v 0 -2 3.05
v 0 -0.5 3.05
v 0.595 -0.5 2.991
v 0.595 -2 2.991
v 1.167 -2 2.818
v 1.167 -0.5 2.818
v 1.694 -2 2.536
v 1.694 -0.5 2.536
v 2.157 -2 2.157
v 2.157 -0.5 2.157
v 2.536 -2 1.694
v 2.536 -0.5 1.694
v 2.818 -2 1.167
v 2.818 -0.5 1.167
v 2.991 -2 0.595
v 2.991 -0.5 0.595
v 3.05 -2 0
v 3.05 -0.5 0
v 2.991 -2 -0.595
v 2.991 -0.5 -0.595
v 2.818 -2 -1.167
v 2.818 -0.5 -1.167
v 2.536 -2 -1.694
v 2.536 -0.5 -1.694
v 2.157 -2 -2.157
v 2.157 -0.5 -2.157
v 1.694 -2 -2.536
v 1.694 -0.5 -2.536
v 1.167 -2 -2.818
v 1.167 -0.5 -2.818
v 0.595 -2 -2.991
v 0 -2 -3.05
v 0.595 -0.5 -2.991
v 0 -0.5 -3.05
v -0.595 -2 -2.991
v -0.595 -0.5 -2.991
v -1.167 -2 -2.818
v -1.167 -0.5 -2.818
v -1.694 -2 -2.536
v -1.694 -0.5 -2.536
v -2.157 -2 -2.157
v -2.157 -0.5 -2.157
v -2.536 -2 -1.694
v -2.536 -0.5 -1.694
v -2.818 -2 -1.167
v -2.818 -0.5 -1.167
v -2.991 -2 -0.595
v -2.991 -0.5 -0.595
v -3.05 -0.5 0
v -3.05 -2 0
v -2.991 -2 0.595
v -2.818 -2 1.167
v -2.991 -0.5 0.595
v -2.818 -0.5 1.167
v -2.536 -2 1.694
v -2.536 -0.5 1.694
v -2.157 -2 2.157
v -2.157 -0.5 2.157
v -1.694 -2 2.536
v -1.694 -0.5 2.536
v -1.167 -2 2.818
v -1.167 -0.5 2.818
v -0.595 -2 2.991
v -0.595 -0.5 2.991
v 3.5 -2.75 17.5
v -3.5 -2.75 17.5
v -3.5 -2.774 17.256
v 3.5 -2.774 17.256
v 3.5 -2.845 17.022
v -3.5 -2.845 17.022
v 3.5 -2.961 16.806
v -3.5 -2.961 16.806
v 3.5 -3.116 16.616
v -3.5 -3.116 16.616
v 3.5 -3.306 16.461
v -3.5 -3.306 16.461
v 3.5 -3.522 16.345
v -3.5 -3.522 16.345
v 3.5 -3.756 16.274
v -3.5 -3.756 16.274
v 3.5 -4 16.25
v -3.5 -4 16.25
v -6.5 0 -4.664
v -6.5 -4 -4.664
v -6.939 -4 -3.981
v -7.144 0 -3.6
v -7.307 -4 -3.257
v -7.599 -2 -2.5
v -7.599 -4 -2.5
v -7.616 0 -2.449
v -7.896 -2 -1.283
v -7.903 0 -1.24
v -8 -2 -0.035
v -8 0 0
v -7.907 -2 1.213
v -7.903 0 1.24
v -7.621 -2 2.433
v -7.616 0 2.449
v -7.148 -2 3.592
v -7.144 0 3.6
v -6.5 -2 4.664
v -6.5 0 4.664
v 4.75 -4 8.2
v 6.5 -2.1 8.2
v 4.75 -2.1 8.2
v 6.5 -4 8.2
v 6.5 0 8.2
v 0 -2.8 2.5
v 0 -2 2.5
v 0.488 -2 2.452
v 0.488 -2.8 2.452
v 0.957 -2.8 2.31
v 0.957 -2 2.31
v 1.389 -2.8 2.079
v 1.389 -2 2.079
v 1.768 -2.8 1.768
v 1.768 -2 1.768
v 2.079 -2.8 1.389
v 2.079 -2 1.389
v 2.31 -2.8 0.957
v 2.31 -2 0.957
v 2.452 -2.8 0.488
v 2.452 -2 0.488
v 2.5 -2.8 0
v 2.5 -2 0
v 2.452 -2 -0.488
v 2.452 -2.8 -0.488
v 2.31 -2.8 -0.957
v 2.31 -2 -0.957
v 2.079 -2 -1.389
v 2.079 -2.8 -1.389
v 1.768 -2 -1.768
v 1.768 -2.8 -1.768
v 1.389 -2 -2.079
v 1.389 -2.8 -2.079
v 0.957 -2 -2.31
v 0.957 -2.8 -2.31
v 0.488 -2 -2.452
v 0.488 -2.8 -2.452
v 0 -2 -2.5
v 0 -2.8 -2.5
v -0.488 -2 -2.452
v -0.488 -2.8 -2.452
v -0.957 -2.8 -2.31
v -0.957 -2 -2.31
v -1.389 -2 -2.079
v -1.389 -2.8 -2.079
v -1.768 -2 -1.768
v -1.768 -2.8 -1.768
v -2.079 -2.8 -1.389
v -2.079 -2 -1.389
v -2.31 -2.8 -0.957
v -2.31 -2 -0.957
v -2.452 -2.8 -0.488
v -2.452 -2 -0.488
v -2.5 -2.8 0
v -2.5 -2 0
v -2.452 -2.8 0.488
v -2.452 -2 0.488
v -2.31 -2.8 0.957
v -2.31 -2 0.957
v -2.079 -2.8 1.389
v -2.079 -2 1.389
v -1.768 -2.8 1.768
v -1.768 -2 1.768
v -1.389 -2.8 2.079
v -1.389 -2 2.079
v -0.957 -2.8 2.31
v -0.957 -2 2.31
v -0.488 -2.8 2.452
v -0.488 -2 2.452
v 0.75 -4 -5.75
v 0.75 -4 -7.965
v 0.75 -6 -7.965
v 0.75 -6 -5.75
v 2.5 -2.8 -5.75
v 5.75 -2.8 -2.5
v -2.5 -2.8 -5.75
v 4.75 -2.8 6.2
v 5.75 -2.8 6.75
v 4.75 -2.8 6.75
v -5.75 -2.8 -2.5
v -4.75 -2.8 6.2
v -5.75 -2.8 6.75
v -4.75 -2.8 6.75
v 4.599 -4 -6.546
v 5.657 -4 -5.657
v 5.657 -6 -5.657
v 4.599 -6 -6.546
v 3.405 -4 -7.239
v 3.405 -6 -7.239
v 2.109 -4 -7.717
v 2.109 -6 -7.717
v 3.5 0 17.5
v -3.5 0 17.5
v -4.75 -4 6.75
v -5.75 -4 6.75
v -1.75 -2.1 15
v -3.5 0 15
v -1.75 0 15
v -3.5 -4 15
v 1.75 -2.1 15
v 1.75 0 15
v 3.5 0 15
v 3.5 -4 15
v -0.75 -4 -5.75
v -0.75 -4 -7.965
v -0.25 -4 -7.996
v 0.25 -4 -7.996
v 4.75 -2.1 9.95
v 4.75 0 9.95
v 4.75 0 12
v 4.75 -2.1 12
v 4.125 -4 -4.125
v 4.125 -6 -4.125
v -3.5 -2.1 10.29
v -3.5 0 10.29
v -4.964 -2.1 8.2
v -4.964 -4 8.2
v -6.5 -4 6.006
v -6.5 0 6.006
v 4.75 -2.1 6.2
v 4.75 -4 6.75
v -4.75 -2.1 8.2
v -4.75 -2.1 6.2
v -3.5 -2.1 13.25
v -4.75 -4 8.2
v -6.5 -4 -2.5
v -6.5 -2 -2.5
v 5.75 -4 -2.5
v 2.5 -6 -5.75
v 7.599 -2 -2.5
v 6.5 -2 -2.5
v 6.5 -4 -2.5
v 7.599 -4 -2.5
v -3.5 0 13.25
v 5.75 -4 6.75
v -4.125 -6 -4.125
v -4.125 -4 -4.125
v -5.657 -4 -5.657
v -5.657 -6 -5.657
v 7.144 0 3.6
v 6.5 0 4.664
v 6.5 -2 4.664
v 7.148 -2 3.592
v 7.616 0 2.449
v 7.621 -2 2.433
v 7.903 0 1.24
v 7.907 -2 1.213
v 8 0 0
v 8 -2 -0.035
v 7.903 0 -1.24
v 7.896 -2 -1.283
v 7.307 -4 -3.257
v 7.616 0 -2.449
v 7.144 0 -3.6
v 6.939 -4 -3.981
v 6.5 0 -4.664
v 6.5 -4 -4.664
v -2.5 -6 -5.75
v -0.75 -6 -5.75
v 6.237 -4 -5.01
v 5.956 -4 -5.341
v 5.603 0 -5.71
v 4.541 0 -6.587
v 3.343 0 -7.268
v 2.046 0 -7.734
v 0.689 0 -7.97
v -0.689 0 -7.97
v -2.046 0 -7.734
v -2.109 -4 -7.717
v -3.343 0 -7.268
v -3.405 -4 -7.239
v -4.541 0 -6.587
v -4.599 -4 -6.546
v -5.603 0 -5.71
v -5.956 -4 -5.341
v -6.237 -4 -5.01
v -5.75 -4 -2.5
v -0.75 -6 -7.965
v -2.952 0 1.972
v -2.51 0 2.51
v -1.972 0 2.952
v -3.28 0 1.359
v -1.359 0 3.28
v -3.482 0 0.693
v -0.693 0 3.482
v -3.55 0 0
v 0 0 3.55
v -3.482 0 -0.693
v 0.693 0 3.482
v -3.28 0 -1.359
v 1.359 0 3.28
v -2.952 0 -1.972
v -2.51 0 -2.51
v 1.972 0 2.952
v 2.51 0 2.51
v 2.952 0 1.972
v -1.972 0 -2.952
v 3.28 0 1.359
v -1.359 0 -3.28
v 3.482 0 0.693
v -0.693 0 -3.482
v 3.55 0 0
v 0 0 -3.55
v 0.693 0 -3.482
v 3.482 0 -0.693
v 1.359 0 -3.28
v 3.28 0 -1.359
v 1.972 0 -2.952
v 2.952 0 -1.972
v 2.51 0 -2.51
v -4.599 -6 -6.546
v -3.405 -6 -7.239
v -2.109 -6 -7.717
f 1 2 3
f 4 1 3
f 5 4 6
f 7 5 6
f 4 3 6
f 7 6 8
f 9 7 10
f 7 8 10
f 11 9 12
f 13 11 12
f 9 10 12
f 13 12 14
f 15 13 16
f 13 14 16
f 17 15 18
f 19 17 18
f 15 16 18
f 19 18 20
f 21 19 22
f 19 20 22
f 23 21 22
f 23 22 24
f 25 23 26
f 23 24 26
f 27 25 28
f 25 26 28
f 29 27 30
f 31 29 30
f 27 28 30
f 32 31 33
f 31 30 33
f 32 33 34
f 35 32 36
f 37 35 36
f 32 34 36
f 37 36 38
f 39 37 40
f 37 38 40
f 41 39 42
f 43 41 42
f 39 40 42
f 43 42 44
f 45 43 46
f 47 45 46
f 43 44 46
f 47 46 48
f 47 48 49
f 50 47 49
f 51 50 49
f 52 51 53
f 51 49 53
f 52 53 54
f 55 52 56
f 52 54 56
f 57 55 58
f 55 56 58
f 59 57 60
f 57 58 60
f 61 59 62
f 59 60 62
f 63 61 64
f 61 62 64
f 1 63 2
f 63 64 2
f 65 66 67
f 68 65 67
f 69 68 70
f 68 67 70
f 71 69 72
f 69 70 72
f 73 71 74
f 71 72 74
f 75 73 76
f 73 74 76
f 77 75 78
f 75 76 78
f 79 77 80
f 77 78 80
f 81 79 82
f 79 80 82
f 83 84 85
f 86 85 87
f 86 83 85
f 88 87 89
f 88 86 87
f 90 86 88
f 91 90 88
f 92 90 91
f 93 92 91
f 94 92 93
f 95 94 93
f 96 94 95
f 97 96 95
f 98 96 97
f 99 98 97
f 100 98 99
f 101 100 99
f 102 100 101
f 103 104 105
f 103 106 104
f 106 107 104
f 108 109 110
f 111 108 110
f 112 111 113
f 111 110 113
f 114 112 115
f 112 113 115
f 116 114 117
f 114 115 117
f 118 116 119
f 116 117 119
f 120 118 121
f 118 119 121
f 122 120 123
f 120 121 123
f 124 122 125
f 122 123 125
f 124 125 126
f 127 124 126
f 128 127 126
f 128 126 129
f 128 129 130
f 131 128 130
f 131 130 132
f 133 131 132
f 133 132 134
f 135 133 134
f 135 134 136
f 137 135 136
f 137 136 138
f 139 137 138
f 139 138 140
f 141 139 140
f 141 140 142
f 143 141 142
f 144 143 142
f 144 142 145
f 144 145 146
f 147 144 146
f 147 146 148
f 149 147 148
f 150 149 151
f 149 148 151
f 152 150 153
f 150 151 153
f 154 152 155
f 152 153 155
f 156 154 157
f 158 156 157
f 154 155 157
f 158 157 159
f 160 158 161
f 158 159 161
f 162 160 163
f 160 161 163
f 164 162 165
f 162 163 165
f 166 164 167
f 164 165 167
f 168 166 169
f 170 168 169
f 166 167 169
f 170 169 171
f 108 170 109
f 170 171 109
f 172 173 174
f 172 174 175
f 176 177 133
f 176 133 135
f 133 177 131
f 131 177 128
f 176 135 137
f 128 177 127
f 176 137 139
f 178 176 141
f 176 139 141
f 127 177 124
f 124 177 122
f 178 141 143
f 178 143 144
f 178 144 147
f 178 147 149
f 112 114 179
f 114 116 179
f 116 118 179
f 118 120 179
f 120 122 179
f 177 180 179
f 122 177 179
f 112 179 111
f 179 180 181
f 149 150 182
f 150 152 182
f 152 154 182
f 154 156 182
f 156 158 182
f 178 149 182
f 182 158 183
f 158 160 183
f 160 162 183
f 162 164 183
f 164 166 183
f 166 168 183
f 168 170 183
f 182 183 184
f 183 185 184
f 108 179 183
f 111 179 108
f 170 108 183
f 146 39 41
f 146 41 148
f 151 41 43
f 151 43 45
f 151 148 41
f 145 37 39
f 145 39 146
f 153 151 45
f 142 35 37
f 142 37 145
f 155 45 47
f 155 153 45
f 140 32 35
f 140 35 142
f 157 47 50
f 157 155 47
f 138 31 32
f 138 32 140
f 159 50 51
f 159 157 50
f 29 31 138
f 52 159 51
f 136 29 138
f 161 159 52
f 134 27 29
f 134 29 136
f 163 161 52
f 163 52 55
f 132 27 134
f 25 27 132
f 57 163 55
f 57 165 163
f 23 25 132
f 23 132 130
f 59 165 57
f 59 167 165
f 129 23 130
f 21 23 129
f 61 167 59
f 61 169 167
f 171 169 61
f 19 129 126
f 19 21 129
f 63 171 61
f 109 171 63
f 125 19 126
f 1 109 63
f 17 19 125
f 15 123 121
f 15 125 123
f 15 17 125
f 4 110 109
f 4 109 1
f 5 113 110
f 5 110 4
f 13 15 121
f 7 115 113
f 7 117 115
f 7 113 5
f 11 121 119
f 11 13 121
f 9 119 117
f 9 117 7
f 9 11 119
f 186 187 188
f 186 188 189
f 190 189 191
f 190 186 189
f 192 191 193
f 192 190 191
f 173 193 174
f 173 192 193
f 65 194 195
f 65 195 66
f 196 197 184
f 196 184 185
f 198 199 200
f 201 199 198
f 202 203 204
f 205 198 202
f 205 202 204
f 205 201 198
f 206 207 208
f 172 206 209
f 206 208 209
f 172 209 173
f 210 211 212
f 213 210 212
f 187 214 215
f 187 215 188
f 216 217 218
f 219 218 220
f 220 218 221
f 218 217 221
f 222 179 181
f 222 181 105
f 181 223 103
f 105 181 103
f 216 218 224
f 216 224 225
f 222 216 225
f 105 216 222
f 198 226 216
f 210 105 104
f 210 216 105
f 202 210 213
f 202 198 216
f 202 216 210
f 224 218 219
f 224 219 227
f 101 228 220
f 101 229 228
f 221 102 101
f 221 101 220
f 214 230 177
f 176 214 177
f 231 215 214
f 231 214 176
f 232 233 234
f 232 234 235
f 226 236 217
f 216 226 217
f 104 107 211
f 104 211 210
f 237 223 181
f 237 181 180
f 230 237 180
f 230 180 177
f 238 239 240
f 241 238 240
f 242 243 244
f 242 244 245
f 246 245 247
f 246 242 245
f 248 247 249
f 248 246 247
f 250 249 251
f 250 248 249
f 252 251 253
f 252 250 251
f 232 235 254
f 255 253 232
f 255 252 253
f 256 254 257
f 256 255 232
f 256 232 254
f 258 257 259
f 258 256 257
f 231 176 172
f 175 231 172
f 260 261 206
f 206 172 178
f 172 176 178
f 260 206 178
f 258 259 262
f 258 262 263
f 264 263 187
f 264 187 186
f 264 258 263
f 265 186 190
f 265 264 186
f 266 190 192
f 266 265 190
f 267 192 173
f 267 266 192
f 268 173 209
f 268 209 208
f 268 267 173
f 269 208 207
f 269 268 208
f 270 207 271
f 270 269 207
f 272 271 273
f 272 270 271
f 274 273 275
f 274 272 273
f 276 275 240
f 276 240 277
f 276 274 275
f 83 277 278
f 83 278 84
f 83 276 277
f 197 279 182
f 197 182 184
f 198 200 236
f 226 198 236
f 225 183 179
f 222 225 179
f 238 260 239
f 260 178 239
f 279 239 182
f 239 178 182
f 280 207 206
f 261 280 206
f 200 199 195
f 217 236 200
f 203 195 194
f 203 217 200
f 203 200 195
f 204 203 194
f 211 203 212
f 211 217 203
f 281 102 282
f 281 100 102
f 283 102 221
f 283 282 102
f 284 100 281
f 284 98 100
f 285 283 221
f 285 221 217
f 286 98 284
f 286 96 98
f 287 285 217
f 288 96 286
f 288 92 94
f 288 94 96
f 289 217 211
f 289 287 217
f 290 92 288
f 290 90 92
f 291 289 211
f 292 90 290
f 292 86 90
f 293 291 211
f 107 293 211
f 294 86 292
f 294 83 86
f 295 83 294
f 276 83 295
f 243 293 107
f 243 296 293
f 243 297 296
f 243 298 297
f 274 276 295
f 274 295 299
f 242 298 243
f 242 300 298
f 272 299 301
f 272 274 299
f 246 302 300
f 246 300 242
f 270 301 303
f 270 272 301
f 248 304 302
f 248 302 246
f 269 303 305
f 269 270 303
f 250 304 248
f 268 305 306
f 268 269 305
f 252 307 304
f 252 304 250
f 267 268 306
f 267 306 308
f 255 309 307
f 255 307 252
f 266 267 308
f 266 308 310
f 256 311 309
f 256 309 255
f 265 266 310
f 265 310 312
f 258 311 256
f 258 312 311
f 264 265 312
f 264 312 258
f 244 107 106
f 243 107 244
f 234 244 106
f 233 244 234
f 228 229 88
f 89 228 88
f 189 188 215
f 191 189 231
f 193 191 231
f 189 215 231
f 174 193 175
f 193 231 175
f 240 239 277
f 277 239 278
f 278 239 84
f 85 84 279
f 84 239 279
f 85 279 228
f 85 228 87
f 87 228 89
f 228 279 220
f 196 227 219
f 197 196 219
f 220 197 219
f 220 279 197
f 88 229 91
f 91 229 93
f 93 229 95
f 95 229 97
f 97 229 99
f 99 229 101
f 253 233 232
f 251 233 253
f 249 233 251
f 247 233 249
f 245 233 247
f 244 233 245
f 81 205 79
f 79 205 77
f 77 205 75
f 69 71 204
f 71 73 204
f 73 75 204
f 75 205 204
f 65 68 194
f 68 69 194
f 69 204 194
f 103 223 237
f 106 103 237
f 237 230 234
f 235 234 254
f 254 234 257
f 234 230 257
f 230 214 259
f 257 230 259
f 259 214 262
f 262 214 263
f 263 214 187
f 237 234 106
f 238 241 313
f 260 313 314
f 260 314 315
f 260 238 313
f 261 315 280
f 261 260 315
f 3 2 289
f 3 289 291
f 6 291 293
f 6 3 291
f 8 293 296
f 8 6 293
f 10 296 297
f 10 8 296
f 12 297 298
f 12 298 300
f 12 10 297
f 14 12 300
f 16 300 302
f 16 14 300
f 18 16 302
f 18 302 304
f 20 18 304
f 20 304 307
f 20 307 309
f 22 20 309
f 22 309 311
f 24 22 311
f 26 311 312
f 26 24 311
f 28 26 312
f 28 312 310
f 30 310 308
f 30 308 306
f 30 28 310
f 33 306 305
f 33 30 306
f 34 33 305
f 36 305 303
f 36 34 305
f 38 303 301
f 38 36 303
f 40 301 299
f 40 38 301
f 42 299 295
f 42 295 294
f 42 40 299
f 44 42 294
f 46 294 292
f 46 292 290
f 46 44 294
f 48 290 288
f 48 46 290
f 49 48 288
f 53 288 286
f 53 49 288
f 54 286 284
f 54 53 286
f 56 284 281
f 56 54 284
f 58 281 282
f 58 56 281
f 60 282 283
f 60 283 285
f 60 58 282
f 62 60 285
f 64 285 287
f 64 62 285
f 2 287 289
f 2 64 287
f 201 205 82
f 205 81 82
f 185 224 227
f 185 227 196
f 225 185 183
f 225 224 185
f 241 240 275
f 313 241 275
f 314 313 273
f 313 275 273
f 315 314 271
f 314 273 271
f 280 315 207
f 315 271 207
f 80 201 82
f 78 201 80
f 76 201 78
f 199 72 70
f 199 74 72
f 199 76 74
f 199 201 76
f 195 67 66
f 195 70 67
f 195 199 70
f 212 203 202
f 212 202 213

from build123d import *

# Parameters (mm, degrees)
BOSS_EXTRUDE1_DEPTH      = 4
SKETCH2_R                = 2.5
CUT_EXTRUDE1_DEPTH       = 22.9089023
SKETCH3_R                = 3.05
CUT_EXTRUDE2_DEPTH       = 2
CUT_EXTRUDE3_DEPTH       = 1.2
CUT_EXTRUDE5_DEPTH       = 0.7
CUT_EXTRUDE8_START       = -2
CUT_EXTRUDE8_DEPTH       = 2
BOSS_EXTRUDE3_DEPTH      = 2
BOSS_EXTRUDE4_DEPTH      = 1.9
CUT_EXTRUDE10_DEPTH      = 22.9089023
CUT_EXTRUDE10_DEPTH_BACK = 22.9089023
CUT_EXTRUDE11_DEPTH      = 23.360679775
CUT_EXTRUDE12_DEPTH      = 24.837994882
CUT_EXTRUDE12_DEPTH_BACK = 24.837994882
CHAMFER1_SIZE            = 1.75
CUT_EXTRUDE13_DEPTH      = 24.837994882
CUT_EXTRUDE14_DEPTH      = 21.155644371
CHAMFER2_SIZE            = 0.5


with BuildPart() as part:
    # Sketch1 → Boss-Extrude1 (new body)
    with BuildSketch(Plane(origin=(0, 0, 0), x_dir=(1, 0, 0), z_dir=(0, 1, 0))):
        with BuildLine():
            Line((-6.5, -20), (6.5, -20))
            Line((6.5, -20), (6.5, -4.663689527))
            ThreePointArc((6.5, -4.663689527), (8, 0), (6.5, 4.663689527))
            ThreePointArc((6.5, 4.663689527), (0, 8), (-6.5, 4.663689527))
            ThreePointArc((-6.5, 4.663689527), (-8, 0), (-6.5, -4.663689527))
            Line((-6.5, -4.663689527), (-6.5, -20))
        make_face()
    extrude(amount=-BOSS_EXTRUDE1_DEPTH)

    # Sketch2 → Cut-Extrude1 (cut, through all)
    with BuildSketch(Plane(origin=(0, 0, 0), x_dir=(1, 0, 0), z_dir=(0, 1, 0))):
        with Locations(Location((0, 0, 0), (0, 0, 270))):
            Circle(SKETCH2_R)
    extrude(amount=-CUT_EXTRUDE1_DEPTH, mode=Mode.SUBTRACT)

    # Sketch3 → Cut-Extrude2 (cut)
    with BuildSketch(Plane(origin=(0, 0, 0), x_dir=(1, 0, 0), z_dir=(0, 1, 0))):
        with Locations(Location((0, 0, 0), (0, 0, 270))):
            Circle(SKETCH3_R)
    extrude(amount=-CUT_EXTRUDE2_DEPTH, mode=Mode.SUBTRACT)

    # Sketch4 → Cut-Extrude3 (cut)
    with BuildSketch(Plane.XZ.offset(4)):
        Polygon((2.5, -5.75), (-2.5, -5.75), (-5.75, -2.5), (-5.75, 6.75), (-4.75, 6.75), (-4.75, 8.2), (-6.010373569, 10), (-6.5, 10), (-6.5, 10.699259012), (-6.5, 15), (6.5, 15), (6.5, 10.699259012), (6.5, 10), (6.5, 8.2), (4.75, 8.2), (4.75, 6.75), (5.75, 6.75), (5.75, -2.5), align=None)
    extrude(amount=-CUT_EXTRUDE3_DEPTH, mode=Mode.SUBTRACT)

    # Sketch6 → Cut-Extrude5 (cut)
    with BuildSketch(Plane.XZ.offset(2.8)):
        Polygon((6.5, 8.2), (6.5, 15), (-6.5, 15), (-6.5, 10.699259012), (-6.010373569, 10), (-4.75, 8.2), (-4.75, 6.2), (4.75, 6.2), (4.75, 8.2), align=None)
    extrude(amount=-CUT_EXTRUDE5_DEPTH, mode=Mode.SUBTRACT)

    # Sketch10 → Cut-Extrude8 (cut)
    with BuildSketch(Plane.XZ.offset(4).offset(CUT_EXTRUDE8_START)):
        with BuildLine():
            Line((-6.5, 4.663689527), (-6.5, -2.5))
            Line((-6.5, -2.5), (-7.599342077, -2.5))
            ThreePointArc((-7.599342077, -2.5), (-7.907431546, 1.213476964), (-6.5, 4.663689527))
        make_face()
        with BuildLine():
            Line((6.5, 4.663689527), (6.5, -2.5))
            Line((6.5, -2.5), (7.599342077, -2.5))
            ThreePointArc((7.599342077, -2.5), (7.907431546, 1.213476964), (6.5, 4.663689527))
        make_face()
    extrude(amount=CUT_EXTRUDE8_DEPTH, mode=Mode.SUBTRACT)

    # Sketch11 → Boss-Extrude3 (add)
    with BuildSketch(Plane.XZ.offset(4)):
        with BuildLine():
            Line((-0.75, -7.964766161), (-0.75, -5.75))
            Line((-0.75, -5.75), (-2.5, -5.75))
            Line((-2.5, -5.75), (-4.125, -4.125))
            Line((-4.125, -4.125), (-5.656854249, -5.656854249))
            ThreePointArc((-5.656854249, -5.656854249), (-3.404931672, -7.239229262), (-0.75, -7.964766161))
        make_face()
        with BuildLine():
            Line((0.75, -7.964766161), (0.75, -5.75))
            Line((0.75, -5.75), (2.5, -5.75))
            Line((2.5, -5.75), (4.125, -4.125))
            Line((4.125, -4.125), (5.656854249, -5.656854249))
            ThreePointArc((5.656854249, -5.656854249), (3.404931672, -7.239229262), (0.75, -7.964766161))
        make_face()
    extrude(amount=BOSS_EXTRUDE3_DEPTH)

    # Sketch14 → Boss-Extrude4 (add)
    with BuildSketch(Plane.XZ.offset(2.1)):
        Polygon((-4.75, 8.2), (-6.010373569, 10), (-6.5, 10), (-6.5, 15), (-4.75, 15), align=None)
    extrude(amount=BOSS_EXTRUDE4_DEPTH)

    # Sketch15 → Cut-Extrude10 (cut, two sides: drawn at the far end of the back side and taken through both)
    with BuildSketch(Plane.XZ.offset(4).offset(-CUT_EXTRUDE10_DEPTH_BACK)):
        Polygon((-6.5, 15), (-6.5, 8.2), (-4.75, 8.2), (-4.75, 15), (-3.5, 15), (-3.5, 20), (-6.5, 20), align=None)
        Polygon((6.5, 8.2), (4.75, 8.2), (4.75, 15), (3.5, 15), (3.5, 20), (6.5, 20), (6.5, 15), align=None)
    extrude(amount=CUT_EXTRUDE10_DEPTH + CUT_EXTRUDE10_DEPTH_BACK, mode=Mode.SUBTRACT)

    # Sketch16 → Cut-Extrude11 (cut, through all)
    with BuildSketch(Plane(origin=(0, 0, 0), x_dir=(1, 0, 0), z_dir=(0, 1, 0))):
        Polygon((-1.75, -15), (-4.75, -12), (-4.75, -15), (-3.5, -15), align=None)
        Polygon((4.75, -12), (4.75, -15), (1.75, -15), align=None)
    extrude(amount=-CUT_EXTRUDE11_DEPTH, mode=Mode.SUBTRACT)

    # Sketch17 → Cut-Extrude12 (cut, two sides: drawn at the far end of the back side and taken through both)
    with BuildSketch(Plane(origin=(3.5, 0, 0), x_dir=(0, 0, -1), z_dir=(1, 0, 0)).offset(-CUT_EXTRUDE12_DEPTH_BACK)):
        with BuildLine():
            Line((-16.25, -4), (-18.75, -4))
            ThreePointArc((-18.75, -4), (-17.5, -2.75), (-16.25, -4))
        make_face()
    extrude(amount=CUT_EXTRUDE12_DEPTH + CUT_EXTRUDE12_DEPTH_BACK, mode=Mode.SUBTRACT)

    # Chamfer1
    chamfer1_edges = [part.edges().sort_by_distance(p)[0] for p in [
        (-4.75, -1.05, 8.2),
        (4.75, -1.05, 8.2),
    ]]
    chamfer(chamfer1_edges, length=CHAMFER1_SIZE - 0.0001)  # a hair under: the kernel refuses the full size

    # Sketch18 → Cut-Extrude13 (cut, through all)
    with BuildSketch(Plane(origin=(3.5, 0, 0), x_dir=(0, 0, -1), z_dir=(1, 0, 0))):
        with BuildLine():
            Line((-18.75, -4), (-20, -4))
            Line((-20, -4), (-20, 0))
            Line((-20, 0), (-18.75, 0))
            Line((-18.75, 0), (-17.5, 0))
            Line((-17.5, 0), (-17.5, -2.75))
            ThreePointArc((-17.5, -2.75), (-18.383883476, -3.116116524), (-18.75, -4))
        make_face()
    extrude(amount=-CUT_EXTRUDE13_DEPTH, mode=Mode.SUBTRACT)

    # Sketch19 → Cut-Extrude14 (cut, through all)
    with BuildSketch(Plane(origin=(0, 0, 0), x_dir=(1, 0, 0), z_dir=(0, 1, 0))):
        Polygon((-3.5, -10.290482648), (-6.5, -6.006038628), (-6.5, -13.25), (-3.5, -13.25), align=None)
    extrude(amount=-CUT_EXTRUDE14_DEPTH, mode=Mode.SUBTRACT)

    # Chamfer2
    chamfer2_edges = [part.edges().sort_by_distance(p)[0] for p in [
        (0, 0, -3.05),
    ]]
    chamfer(chamfer2_edges, length=CHAMFER2_SIZE)


solid = part.part
